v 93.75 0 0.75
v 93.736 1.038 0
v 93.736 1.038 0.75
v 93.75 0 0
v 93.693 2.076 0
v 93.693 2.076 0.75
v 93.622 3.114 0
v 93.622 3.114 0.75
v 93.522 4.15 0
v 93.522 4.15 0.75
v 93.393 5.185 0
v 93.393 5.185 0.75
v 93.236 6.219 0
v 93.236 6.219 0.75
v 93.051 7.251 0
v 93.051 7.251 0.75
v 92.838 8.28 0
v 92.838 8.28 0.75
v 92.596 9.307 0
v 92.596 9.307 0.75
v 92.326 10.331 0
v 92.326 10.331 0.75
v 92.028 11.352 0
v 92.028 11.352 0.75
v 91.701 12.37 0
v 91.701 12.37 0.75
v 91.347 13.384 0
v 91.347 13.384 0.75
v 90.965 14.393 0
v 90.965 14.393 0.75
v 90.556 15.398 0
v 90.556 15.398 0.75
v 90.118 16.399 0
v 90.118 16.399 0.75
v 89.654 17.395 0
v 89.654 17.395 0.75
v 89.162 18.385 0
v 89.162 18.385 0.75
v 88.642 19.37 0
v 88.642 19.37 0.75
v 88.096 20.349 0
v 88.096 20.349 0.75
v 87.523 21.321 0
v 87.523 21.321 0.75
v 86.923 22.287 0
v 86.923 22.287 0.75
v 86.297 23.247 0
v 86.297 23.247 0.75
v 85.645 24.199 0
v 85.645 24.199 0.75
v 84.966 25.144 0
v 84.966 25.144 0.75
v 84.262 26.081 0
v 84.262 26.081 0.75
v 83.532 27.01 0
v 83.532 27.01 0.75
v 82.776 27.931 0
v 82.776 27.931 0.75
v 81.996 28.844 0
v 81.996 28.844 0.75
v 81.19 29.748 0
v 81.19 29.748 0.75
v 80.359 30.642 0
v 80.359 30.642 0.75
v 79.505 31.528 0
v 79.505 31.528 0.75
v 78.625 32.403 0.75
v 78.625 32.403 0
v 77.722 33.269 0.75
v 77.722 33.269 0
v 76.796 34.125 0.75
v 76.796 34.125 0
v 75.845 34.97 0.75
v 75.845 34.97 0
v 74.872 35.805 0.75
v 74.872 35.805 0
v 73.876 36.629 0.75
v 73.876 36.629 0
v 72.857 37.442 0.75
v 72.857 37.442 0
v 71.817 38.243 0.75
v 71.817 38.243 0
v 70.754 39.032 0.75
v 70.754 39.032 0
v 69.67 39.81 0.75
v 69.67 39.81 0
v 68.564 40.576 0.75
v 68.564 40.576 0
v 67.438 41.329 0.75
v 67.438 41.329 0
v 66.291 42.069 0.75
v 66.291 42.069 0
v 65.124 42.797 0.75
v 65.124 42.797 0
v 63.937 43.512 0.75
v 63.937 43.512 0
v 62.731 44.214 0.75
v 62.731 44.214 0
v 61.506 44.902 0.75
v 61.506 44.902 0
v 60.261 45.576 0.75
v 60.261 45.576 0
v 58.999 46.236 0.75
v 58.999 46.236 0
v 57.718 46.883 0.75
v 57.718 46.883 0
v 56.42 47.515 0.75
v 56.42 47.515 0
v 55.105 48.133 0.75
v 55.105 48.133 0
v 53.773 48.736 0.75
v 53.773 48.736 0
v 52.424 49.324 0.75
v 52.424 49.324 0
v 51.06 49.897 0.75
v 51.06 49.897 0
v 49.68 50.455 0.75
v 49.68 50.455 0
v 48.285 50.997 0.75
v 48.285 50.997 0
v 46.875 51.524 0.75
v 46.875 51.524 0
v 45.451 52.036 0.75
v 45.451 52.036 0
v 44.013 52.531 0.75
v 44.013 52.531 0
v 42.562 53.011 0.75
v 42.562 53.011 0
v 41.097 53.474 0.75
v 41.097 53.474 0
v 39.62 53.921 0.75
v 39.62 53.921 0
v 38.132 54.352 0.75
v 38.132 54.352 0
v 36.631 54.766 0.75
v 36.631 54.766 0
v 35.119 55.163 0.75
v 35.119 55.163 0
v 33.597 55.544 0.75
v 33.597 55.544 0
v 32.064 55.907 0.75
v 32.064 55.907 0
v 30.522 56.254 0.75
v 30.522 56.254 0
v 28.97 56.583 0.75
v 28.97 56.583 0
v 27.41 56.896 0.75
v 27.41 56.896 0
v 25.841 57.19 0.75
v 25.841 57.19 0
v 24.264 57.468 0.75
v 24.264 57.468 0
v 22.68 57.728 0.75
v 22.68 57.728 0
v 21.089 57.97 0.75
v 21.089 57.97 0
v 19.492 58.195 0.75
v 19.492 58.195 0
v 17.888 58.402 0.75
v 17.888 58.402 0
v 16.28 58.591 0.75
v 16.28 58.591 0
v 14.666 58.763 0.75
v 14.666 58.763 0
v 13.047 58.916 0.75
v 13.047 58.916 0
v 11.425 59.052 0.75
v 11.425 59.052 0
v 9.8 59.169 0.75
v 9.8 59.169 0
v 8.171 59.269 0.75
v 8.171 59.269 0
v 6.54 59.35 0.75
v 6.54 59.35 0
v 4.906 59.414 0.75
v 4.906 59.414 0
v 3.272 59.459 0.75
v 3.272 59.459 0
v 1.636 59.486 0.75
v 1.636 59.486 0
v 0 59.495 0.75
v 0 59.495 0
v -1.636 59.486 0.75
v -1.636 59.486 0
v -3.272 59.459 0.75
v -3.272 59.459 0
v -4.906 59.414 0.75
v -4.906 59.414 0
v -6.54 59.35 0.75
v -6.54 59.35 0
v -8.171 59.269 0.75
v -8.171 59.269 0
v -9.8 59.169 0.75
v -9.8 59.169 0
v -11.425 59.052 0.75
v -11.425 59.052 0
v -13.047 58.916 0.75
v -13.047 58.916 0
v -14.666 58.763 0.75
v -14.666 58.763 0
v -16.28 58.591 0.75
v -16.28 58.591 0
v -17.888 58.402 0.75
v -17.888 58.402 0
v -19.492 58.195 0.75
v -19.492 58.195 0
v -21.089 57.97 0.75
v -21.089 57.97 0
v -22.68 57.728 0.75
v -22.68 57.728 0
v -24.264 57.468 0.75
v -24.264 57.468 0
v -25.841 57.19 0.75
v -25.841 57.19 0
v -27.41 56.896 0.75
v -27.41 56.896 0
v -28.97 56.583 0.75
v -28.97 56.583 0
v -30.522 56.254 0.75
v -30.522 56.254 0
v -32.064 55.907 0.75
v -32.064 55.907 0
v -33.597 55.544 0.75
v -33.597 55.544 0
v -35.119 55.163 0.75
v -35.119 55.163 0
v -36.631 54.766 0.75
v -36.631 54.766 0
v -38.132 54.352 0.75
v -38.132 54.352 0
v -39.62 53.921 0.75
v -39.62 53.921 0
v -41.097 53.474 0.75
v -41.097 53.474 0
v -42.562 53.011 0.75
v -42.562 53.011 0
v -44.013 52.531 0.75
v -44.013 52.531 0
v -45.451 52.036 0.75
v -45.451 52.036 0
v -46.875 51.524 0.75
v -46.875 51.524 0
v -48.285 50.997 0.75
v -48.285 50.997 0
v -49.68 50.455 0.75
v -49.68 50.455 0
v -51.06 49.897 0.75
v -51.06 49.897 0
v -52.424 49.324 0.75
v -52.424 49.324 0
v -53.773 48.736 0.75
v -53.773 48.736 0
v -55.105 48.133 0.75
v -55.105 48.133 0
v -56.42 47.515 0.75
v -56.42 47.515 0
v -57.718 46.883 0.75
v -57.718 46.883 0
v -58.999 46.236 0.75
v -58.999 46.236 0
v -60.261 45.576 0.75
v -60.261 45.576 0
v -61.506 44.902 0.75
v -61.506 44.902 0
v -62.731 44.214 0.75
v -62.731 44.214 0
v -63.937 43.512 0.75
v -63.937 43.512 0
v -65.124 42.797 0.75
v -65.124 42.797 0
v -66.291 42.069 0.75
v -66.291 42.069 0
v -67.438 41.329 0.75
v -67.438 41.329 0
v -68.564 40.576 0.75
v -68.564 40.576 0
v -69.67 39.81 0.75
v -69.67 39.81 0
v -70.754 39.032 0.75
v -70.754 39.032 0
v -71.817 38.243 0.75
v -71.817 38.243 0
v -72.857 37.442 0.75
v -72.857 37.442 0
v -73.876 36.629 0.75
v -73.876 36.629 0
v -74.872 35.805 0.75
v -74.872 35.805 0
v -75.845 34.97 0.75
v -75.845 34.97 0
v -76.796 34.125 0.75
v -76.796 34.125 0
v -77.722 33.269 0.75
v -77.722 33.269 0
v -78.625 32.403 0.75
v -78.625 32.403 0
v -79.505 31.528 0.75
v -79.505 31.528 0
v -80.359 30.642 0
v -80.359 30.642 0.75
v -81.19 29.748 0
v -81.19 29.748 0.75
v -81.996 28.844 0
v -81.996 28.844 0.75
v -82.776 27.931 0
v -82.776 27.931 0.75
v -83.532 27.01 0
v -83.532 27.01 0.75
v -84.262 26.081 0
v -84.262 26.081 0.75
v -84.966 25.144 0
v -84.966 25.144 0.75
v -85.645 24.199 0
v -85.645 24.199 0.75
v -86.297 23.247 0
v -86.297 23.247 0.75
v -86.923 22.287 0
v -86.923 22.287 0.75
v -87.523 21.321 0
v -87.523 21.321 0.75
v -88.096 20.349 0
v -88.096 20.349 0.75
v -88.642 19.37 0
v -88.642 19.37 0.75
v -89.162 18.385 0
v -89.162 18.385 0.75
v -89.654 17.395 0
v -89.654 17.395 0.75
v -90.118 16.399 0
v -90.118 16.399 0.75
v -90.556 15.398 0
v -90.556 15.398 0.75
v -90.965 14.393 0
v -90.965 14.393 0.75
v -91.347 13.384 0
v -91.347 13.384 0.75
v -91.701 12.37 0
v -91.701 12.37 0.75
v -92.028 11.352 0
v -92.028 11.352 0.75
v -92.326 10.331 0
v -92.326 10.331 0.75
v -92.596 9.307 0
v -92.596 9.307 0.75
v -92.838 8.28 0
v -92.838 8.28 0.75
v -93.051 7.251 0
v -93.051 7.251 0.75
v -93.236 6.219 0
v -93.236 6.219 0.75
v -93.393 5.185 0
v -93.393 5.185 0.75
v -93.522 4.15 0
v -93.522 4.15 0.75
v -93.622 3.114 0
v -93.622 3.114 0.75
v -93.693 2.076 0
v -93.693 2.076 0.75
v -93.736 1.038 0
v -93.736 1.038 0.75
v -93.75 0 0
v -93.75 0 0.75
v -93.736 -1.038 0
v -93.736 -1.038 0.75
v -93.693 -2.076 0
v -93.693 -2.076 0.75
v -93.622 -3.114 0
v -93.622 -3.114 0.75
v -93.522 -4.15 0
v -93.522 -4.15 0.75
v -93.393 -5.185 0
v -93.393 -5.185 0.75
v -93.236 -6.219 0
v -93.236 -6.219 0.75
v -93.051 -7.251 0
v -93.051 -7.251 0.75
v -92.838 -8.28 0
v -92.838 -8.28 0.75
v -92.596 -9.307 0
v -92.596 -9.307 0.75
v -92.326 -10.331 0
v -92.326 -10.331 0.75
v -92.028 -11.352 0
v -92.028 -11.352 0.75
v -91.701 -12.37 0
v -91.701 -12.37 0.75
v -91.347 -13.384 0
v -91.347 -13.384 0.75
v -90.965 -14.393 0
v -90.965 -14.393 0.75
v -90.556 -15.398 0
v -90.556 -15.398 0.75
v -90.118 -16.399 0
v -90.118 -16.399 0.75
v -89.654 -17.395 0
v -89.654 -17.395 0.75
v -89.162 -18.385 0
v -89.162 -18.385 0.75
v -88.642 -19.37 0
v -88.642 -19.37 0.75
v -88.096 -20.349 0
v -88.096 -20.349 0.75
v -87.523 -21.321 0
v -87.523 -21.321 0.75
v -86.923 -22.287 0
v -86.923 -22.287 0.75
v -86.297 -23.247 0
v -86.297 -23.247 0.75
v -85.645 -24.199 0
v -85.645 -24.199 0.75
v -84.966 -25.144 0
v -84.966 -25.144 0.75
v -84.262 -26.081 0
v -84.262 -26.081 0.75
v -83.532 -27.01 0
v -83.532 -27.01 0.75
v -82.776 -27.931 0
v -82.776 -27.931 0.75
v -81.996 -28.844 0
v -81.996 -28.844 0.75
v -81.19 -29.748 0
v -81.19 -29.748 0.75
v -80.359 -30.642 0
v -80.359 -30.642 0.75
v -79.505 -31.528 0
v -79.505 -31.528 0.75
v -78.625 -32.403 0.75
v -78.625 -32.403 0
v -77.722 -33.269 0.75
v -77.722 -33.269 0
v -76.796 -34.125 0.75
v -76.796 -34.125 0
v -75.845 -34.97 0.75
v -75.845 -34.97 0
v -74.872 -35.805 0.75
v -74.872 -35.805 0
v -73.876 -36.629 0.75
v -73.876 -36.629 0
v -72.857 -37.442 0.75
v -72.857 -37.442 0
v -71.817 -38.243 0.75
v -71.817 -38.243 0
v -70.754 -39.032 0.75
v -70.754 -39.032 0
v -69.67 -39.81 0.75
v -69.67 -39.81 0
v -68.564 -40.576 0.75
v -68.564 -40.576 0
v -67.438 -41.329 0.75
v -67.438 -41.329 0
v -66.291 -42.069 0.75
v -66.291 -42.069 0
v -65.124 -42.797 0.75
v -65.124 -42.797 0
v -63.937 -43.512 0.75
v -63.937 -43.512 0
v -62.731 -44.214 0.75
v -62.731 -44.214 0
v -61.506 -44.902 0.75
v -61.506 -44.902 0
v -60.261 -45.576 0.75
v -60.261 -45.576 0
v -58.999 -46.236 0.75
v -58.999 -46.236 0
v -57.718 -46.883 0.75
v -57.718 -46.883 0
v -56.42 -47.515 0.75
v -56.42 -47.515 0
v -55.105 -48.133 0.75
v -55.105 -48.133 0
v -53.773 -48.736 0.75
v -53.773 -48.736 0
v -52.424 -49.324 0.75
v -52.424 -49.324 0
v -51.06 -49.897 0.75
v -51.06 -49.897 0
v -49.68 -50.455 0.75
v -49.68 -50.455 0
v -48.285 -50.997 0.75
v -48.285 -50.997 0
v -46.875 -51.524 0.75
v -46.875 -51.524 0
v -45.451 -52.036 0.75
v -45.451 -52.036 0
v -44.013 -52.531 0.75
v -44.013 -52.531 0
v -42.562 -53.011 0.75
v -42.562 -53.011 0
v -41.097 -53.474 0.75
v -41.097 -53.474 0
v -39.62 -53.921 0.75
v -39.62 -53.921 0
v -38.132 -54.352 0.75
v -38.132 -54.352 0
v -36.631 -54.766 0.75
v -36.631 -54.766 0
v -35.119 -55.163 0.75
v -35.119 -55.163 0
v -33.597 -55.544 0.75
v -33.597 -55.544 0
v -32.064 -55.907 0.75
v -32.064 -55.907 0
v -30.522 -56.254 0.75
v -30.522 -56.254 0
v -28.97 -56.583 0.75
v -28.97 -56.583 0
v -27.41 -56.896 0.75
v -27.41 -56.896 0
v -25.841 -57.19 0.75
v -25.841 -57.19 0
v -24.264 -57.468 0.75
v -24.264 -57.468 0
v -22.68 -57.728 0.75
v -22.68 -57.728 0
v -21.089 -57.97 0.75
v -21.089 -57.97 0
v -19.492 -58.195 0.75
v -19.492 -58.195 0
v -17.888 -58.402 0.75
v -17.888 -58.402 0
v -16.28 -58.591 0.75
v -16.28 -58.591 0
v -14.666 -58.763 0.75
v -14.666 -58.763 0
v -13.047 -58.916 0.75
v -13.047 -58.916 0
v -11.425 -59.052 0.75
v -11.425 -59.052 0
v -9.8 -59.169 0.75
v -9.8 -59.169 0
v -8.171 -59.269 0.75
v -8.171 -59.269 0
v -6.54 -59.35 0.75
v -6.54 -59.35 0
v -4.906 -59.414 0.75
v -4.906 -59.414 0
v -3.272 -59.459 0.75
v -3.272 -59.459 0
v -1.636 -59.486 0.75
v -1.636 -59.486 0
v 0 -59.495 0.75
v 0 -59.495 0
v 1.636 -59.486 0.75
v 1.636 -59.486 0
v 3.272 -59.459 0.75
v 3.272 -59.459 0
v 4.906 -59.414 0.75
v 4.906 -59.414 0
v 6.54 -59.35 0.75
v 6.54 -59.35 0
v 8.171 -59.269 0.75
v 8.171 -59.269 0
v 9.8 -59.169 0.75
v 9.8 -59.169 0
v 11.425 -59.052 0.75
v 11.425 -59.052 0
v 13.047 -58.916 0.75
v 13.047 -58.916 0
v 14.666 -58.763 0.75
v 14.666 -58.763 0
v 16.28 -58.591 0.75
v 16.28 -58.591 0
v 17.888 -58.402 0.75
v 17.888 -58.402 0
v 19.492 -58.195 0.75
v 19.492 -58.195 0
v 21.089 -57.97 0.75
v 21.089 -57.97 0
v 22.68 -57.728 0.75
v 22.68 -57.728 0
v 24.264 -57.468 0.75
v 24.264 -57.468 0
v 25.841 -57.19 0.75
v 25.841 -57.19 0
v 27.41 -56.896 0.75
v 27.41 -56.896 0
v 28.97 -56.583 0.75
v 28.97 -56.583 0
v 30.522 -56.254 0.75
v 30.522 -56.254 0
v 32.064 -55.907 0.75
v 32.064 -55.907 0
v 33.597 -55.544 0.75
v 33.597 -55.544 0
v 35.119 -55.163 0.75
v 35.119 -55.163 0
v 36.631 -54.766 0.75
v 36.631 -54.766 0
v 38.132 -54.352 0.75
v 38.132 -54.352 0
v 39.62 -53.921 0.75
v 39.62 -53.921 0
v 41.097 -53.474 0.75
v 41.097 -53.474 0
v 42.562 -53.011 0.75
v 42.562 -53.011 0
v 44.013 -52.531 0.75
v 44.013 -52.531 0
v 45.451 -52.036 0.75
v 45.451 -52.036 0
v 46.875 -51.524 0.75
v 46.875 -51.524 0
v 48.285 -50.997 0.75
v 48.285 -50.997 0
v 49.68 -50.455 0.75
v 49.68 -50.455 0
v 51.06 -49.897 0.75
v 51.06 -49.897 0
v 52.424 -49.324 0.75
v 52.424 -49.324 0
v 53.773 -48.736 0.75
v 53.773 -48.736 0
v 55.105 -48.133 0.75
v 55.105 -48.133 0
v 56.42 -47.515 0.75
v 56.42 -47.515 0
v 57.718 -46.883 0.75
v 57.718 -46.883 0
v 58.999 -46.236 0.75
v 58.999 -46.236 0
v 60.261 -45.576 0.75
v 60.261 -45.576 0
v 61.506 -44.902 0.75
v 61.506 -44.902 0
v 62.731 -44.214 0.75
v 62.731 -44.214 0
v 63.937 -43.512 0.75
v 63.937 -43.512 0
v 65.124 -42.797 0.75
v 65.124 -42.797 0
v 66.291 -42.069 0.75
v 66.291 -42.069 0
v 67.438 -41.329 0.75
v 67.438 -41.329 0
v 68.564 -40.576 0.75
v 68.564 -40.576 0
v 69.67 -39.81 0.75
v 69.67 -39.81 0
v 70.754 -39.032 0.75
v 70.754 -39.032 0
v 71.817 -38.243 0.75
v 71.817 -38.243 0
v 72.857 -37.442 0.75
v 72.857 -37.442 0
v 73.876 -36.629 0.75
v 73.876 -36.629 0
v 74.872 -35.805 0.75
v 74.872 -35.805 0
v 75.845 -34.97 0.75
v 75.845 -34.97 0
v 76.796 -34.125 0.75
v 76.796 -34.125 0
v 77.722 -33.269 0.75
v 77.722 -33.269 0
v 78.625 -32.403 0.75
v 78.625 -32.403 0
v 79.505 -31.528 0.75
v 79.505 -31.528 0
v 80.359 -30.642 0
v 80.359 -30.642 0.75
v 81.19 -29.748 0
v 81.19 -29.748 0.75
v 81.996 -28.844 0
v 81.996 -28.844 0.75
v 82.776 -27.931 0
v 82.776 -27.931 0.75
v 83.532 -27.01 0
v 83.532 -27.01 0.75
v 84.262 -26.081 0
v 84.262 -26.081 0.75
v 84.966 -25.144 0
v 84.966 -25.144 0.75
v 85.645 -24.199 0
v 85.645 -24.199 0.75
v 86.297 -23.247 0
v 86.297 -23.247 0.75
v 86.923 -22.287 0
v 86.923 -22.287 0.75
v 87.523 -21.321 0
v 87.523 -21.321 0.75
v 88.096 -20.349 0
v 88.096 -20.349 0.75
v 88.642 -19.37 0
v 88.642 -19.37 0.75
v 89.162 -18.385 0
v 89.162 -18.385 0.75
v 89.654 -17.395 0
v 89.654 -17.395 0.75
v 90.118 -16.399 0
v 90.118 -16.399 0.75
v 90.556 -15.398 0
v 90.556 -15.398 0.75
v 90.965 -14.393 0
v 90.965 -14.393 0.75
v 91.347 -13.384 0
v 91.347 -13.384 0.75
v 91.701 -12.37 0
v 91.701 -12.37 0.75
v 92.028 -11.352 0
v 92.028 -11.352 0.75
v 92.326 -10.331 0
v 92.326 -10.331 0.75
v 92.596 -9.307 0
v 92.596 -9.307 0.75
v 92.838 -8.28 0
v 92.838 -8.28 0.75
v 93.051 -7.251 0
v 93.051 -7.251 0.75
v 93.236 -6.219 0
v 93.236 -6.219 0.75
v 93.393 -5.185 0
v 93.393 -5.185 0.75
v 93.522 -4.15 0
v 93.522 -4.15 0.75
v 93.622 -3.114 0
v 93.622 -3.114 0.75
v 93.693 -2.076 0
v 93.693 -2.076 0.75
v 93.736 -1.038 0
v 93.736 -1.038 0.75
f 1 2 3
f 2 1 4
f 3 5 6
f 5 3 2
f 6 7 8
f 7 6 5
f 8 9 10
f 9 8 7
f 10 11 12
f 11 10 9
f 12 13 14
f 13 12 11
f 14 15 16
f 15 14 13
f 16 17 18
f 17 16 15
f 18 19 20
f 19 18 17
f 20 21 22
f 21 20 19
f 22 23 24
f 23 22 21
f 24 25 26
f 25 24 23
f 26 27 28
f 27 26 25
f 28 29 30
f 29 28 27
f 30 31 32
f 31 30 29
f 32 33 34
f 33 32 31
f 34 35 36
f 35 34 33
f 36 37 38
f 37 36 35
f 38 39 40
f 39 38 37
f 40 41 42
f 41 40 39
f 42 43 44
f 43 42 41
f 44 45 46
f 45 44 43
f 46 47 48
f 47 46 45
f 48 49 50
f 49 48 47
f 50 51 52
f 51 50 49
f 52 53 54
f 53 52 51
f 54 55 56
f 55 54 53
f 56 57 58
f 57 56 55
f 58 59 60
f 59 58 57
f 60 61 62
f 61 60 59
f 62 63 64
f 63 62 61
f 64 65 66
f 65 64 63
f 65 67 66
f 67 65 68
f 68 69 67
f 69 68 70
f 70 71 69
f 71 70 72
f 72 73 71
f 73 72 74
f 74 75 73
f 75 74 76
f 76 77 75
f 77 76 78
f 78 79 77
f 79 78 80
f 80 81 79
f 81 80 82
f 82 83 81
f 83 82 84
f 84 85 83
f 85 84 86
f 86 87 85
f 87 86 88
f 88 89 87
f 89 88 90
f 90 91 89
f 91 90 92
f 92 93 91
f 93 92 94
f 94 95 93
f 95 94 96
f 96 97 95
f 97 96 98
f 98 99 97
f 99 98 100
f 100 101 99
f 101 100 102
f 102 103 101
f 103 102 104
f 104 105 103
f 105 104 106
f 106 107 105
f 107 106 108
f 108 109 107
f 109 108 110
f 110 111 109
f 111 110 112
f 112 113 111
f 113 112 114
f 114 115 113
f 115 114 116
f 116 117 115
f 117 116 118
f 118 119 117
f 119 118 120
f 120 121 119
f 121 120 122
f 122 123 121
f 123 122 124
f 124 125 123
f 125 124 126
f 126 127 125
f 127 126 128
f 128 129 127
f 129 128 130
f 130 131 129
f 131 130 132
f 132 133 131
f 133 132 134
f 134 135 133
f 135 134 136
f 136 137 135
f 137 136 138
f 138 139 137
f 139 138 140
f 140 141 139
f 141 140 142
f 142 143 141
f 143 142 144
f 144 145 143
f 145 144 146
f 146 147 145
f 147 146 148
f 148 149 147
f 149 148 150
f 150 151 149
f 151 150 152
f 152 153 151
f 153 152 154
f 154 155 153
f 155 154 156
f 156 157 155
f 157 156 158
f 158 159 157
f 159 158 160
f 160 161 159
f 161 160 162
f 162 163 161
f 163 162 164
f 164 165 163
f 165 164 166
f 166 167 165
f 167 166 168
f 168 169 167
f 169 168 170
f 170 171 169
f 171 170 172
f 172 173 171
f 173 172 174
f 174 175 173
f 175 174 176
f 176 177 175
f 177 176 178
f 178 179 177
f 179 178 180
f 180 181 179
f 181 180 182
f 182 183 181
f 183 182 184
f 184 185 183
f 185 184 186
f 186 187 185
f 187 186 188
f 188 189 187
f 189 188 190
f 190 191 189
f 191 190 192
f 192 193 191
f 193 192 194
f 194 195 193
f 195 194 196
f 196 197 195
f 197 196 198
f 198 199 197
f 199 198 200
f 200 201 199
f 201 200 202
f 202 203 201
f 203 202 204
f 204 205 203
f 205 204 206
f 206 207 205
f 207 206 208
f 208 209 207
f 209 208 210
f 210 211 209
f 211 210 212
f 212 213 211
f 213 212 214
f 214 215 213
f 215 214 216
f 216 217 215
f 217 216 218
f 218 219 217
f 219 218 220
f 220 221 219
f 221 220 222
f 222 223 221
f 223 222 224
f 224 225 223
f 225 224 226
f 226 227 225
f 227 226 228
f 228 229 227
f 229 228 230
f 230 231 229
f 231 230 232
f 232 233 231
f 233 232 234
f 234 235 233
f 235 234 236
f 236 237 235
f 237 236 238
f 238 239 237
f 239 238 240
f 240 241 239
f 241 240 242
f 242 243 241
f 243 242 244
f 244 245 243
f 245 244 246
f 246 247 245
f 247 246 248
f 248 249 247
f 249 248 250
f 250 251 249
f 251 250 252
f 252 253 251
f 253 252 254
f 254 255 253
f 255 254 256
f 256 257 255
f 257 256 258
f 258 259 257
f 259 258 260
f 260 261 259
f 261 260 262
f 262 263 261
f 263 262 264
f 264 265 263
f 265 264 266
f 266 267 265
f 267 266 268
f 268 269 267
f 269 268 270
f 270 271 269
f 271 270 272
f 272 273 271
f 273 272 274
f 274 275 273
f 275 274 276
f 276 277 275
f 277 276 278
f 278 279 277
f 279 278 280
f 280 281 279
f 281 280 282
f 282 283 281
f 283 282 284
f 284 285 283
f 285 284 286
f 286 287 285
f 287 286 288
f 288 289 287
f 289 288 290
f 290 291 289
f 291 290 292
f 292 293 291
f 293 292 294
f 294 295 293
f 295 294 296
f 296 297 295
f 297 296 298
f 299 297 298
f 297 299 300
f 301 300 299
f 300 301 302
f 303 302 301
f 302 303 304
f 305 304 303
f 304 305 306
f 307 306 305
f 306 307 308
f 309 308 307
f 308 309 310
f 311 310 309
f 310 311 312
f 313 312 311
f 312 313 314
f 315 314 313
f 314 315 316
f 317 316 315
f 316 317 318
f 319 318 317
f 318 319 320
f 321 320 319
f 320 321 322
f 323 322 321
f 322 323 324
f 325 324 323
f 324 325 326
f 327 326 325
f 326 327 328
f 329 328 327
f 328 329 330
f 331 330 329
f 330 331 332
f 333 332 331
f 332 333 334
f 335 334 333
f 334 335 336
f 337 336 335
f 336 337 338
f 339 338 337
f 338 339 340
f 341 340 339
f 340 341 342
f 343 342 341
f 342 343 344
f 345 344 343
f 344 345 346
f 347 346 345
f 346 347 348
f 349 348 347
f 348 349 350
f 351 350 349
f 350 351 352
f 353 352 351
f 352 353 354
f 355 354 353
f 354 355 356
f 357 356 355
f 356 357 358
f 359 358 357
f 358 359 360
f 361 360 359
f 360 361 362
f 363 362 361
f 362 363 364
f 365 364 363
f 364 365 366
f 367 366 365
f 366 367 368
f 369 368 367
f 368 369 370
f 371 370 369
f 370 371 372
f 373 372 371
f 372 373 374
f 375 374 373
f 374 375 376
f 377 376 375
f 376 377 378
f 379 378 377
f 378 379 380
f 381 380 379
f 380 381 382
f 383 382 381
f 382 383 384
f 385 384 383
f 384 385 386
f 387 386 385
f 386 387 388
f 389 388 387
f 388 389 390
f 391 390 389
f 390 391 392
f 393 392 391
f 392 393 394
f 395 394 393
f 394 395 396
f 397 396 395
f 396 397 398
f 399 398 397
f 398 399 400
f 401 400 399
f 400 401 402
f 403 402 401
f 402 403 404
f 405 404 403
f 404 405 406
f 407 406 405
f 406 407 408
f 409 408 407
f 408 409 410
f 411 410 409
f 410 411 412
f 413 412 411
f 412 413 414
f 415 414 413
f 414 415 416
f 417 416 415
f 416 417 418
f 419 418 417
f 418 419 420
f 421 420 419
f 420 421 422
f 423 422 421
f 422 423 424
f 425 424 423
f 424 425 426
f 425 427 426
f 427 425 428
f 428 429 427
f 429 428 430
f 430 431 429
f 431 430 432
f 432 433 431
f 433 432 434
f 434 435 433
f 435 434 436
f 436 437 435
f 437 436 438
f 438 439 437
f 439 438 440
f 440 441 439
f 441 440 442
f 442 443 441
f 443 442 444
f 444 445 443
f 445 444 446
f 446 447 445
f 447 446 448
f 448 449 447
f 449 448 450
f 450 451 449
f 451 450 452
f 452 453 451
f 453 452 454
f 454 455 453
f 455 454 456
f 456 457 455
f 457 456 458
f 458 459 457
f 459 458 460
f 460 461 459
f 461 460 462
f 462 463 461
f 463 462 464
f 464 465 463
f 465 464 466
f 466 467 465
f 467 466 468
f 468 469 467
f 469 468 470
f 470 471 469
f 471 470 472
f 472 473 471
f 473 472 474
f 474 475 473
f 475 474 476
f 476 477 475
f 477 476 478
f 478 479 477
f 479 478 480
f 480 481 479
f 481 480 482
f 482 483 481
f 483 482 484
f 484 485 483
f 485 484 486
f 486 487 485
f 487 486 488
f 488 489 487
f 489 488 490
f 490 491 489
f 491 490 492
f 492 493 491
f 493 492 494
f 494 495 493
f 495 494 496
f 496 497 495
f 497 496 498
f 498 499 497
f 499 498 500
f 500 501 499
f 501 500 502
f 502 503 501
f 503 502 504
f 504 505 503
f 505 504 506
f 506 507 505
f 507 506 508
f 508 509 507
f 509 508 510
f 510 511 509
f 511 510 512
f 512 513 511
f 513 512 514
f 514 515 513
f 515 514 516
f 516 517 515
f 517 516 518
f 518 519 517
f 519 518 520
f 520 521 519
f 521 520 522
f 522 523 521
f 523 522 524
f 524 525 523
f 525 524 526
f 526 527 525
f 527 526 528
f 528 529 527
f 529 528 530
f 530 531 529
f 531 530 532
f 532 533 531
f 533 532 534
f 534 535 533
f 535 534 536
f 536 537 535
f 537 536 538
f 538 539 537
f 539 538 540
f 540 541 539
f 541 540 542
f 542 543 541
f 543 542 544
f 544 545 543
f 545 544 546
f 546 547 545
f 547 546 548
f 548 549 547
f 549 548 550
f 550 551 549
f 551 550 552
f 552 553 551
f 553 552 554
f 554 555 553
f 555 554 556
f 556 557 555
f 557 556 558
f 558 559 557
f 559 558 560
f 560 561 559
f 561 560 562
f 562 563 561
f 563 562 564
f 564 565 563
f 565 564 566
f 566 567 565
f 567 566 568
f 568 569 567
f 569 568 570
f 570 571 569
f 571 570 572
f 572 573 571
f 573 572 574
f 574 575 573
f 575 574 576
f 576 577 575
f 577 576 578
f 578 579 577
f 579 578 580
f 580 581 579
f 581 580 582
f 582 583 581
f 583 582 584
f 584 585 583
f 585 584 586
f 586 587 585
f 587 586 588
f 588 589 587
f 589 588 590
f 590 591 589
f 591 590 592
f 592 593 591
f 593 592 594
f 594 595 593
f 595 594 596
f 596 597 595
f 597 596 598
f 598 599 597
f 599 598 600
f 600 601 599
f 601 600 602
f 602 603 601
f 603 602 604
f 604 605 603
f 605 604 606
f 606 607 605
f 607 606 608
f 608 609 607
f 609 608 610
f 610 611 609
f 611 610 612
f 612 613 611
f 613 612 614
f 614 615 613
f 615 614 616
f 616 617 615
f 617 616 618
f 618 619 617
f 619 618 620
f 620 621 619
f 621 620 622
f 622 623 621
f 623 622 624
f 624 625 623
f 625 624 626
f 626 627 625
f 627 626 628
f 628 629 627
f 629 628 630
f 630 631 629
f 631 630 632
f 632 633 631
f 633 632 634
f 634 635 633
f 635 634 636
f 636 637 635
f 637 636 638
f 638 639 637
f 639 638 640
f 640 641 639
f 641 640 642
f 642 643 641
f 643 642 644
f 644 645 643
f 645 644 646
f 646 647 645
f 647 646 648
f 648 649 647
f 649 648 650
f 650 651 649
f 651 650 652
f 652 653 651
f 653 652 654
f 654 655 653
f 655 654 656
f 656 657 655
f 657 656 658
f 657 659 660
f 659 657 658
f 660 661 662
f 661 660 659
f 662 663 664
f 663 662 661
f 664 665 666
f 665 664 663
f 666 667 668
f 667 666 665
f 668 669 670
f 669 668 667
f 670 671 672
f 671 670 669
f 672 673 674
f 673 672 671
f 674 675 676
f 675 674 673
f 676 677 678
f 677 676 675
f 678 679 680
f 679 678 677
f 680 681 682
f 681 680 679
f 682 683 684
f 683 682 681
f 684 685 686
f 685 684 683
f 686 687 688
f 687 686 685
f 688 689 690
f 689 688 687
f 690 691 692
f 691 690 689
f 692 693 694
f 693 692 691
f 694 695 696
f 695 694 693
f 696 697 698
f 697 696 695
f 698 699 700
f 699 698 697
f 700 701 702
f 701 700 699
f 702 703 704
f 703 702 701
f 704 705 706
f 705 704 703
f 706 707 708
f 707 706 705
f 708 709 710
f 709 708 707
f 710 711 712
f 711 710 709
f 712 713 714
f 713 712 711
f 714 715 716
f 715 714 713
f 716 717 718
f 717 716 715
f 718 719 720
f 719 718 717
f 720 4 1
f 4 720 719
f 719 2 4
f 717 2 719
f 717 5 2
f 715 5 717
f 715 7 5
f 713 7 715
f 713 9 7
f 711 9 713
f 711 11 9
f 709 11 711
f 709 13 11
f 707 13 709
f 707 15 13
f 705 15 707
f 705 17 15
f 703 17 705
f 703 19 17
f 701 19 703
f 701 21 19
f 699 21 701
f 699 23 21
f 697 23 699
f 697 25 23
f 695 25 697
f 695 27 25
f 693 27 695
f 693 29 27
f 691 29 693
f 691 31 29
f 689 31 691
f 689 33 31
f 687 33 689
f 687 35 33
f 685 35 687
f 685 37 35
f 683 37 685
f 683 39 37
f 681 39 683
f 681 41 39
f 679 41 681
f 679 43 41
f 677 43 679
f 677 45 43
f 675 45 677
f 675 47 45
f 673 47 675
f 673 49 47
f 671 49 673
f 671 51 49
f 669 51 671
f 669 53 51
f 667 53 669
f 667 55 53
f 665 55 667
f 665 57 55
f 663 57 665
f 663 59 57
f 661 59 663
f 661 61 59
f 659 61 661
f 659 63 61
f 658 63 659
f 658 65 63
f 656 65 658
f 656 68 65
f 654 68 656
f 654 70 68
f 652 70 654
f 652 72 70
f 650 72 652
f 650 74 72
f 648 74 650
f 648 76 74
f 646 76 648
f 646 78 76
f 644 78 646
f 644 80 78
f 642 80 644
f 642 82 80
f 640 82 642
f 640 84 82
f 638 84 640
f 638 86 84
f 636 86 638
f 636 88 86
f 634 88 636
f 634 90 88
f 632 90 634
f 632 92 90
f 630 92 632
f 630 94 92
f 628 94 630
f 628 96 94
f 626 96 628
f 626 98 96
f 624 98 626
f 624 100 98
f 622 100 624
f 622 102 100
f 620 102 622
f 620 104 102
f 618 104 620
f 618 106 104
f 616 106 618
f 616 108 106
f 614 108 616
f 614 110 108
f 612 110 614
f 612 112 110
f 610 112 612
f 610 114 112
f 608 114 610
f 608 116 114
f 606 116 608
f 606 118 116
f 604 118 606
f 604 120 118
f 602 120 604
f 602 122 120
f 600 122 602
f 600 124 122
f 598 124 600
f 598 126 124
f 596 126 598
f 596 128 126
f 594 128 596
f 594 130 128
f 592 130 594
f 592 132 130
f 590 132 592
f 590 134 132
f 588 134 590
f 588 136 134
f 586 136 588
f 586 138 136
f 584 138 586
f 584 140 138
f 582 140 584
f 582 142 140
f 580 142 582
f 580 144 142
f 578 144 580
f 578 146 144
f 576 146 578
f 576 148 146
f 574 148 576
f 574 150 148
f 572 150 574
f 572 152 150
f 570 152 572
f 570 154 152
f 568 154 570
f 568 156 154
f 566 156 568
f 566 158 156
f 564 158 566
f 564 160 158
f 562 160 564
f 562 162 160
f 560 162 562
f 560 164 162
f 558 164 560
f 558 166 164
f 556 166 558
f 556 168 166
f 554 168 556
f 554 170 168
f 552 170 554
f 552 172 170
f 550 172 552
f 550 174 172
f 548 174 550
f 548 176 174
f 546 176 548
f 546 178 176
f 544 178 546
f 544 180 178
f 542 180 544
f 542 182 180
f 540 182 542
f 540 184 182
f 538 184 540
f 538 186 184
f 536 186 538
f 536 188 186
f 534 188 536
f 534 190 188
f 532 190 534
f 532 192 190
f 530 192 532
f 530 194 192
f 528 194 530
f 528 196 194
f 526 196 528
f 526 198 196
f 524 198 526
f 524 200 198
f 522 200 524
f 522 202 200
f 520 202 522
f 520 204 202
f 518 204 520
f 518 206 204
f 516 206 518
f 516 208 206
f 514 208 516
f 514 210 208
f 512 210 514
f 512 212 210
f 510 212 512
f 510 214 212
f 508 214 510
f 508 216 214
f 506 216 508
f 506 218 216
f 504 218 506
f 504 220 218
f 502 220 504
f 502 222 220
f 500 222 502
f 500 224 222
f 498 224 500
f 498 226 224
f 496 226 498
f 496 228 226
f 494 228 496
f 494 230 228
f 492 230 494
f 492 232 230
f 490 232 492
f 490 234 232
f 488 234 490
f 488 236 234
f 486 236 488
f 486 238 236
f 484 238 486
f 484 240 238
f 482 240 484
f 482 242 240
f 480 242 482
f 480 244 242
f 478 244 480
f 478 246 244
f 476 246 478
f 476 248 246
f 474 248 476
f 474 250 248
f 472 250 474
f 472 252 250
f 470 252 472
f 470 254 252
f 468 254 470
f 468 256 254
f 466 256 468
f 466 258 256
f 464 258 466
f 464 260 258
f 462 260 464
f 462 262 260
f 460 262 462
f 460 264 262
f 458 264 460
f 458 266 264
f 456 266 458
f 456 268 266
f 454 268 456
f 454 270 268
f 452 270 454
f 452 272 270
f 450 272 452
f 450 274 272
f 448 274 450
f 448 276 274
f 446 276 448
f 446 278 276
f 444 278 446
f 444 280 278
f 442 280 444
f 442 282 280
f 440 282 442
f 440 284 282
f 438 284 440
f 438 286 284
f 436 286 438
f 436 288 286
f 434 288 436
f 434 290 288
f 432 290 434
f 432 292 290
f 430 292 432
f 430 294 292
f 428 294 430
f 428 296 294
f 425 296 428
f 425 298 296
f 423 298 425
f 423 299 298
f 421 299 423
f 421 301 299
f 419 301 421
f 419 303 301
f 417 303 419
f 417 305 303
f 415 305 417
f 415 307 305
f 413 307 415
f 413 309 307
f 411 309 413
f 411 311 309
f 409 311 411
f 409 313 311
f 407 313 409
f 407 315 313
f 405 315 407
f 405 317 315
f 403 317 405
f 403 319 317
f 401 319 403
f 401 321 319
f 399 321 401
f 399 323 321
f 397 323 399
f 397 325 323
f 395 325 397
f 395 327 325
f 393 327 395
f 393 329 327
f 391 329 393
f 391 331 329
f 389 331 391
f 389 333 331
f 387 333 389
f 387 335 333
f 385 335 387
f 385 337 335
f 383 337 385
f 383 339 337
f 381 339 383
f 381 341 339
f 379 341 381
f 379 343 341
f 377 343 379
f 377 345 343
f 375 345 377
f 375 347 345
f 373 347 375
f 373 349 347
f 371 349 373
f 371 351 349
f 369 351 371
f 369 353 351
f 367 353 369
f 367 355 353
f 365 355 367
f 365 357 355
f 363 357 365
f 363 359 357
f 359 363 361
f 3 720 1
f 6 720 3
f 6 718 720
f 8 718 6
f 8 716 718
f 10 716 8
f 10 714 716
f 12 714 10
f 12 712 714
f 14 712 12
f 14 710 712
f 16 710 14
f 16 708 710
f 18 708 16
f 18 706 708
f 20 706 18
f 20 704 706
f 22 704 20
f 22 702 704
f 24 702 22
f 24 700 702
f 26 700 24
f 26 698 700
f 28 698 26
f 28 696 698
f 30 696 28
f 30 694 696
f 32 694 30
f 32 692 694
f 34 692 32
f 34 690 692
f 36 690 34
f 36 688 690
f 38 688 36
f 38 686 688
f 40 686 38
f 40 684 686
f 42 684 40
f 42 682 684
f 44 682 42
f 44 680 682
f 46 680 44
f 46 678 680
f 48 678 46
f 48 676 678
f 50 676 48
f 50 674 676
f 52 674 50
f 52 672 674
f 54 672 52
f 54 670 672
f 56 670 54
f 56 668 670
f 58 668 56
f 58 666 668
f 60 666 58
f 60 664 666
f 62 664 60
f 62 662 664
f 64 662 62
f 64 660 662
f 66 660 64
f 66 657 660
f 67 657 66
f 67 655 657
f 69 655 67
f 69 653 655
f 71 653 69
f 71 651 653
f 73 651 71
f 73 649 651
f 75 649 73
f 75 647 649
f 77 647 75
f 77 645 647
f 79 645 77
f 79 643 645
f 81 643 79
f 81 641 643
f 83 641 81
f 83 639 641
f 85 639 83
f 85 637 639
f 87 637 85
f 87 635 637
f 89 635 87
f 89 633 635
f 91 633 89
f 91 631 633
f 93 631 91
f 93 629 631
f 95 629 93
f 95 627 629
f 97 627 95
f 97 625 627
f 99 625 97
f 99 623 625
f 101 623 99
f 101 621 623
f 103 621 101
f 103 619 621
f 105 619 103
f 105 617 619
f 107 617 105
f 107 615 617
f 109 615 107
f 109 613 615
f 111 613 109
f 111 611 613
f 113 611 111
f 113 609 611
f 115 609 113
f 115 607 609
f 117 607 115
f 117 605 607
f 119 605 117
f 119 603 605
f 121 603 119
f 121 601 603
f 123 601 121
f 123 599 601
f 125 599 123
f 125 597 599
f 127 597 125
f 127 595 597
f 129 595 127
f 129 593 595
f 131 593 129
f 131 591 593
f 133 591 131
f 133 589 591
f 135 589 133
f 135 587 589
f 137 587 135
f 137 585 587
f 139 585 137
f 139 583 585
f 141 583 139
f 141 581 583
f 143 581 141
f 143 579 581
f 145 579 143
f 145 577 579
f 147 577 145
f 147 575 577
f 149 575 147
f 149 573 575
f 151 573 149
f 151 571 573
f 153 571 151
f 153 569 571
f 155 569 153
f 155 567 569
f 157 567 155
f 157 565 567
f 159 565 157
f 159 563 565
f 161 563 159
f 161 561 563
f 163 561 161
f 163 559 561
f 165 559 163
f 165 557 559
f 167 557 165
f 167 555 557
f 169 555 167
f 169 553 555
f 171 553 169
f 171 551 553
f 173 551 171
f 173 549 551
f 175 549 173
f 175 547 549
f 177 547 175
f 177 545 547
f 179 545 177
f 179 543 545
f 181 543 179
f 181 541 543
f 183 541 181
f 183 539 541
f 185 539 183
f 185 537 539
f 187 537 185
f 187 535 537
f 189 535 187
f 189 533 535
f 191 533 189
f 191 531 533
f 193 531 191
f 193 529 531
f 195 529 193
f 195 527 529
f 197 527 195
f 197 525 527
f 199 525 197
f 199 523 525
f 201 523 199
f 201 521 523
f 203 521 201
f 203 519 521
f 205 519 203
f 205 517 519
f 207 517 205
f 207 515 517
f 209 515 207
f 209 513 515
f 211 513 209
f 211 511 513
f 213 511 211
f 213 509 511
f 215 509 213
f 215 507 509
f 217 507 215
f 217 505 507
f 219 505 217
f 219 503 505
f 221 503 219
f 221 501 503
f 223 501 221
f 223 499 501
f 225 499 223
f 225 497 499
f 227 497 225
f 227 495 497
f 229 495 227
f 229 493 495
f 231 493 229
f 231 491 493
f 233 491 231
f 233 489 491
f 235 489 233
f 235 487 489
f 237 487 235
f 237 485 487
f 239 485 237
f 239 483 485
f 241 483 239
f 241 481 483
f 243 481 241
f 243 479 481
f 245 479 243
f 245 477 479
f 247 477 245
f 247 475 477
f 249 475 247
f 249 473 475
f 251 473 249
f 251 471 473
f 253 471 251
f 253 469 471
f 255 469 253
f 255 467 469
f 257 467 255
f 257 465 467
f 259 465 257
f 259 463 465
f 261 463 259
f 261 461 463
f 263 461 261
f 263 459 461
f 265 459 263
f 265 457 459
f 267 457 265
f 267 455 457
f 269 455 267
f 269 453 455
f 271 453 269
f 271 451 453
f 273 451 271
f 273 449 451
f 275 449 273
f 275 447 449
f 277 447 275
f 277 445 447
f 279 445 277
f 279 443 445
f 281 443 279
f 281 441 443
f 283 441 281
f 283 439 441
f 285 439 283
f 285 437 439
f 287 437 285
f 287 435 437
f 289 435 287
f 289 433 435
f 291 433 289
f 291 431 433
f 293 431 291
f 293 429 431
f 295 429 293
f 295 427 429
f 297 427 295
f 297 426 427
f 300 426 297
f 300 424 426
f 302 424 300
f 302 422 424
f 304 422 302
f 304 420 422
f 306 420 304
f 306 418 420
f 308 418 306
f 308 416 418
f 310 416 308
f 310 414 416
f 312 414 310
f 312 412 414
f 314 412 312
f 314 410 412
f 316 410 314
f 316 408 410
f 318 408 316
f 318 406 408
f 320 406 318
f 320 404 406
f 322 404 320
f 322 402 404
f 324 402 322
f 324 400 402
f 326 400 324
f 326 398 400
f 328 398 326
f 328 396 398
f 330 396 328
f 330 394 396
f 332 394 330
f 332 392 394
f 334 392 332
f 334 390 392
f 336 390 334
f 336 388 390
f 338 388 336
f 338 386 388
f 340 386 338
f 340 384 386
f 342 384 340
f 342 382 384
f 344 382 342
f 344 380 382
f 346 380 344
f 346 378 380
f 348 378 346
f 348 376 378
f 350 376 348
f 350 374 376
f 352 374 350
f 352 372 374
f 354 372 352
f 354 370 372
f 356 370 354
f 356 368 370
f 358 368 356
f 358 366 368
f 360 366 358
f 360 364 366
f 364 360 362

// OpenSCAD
$fn=360;

$length=100;
$width=30;
$height=30;
$radius=5;

$logo_width=150;
$logo_height=$logo_width*33/52;

$length_scale=($logo_height+$width/4)/$length;


scale([$logo_width*1.25,$logo_height*1.25]) cylinder(d=1,h=0.75);



translate([-$logo_width/2,-$logo_height/2]){
    linear_extrude(height=4){
            scale($logo_width/52){
            import("/home/bryce/Downloads/8_TH_SOLID_0004_black.dxf");
        }
    }
}
